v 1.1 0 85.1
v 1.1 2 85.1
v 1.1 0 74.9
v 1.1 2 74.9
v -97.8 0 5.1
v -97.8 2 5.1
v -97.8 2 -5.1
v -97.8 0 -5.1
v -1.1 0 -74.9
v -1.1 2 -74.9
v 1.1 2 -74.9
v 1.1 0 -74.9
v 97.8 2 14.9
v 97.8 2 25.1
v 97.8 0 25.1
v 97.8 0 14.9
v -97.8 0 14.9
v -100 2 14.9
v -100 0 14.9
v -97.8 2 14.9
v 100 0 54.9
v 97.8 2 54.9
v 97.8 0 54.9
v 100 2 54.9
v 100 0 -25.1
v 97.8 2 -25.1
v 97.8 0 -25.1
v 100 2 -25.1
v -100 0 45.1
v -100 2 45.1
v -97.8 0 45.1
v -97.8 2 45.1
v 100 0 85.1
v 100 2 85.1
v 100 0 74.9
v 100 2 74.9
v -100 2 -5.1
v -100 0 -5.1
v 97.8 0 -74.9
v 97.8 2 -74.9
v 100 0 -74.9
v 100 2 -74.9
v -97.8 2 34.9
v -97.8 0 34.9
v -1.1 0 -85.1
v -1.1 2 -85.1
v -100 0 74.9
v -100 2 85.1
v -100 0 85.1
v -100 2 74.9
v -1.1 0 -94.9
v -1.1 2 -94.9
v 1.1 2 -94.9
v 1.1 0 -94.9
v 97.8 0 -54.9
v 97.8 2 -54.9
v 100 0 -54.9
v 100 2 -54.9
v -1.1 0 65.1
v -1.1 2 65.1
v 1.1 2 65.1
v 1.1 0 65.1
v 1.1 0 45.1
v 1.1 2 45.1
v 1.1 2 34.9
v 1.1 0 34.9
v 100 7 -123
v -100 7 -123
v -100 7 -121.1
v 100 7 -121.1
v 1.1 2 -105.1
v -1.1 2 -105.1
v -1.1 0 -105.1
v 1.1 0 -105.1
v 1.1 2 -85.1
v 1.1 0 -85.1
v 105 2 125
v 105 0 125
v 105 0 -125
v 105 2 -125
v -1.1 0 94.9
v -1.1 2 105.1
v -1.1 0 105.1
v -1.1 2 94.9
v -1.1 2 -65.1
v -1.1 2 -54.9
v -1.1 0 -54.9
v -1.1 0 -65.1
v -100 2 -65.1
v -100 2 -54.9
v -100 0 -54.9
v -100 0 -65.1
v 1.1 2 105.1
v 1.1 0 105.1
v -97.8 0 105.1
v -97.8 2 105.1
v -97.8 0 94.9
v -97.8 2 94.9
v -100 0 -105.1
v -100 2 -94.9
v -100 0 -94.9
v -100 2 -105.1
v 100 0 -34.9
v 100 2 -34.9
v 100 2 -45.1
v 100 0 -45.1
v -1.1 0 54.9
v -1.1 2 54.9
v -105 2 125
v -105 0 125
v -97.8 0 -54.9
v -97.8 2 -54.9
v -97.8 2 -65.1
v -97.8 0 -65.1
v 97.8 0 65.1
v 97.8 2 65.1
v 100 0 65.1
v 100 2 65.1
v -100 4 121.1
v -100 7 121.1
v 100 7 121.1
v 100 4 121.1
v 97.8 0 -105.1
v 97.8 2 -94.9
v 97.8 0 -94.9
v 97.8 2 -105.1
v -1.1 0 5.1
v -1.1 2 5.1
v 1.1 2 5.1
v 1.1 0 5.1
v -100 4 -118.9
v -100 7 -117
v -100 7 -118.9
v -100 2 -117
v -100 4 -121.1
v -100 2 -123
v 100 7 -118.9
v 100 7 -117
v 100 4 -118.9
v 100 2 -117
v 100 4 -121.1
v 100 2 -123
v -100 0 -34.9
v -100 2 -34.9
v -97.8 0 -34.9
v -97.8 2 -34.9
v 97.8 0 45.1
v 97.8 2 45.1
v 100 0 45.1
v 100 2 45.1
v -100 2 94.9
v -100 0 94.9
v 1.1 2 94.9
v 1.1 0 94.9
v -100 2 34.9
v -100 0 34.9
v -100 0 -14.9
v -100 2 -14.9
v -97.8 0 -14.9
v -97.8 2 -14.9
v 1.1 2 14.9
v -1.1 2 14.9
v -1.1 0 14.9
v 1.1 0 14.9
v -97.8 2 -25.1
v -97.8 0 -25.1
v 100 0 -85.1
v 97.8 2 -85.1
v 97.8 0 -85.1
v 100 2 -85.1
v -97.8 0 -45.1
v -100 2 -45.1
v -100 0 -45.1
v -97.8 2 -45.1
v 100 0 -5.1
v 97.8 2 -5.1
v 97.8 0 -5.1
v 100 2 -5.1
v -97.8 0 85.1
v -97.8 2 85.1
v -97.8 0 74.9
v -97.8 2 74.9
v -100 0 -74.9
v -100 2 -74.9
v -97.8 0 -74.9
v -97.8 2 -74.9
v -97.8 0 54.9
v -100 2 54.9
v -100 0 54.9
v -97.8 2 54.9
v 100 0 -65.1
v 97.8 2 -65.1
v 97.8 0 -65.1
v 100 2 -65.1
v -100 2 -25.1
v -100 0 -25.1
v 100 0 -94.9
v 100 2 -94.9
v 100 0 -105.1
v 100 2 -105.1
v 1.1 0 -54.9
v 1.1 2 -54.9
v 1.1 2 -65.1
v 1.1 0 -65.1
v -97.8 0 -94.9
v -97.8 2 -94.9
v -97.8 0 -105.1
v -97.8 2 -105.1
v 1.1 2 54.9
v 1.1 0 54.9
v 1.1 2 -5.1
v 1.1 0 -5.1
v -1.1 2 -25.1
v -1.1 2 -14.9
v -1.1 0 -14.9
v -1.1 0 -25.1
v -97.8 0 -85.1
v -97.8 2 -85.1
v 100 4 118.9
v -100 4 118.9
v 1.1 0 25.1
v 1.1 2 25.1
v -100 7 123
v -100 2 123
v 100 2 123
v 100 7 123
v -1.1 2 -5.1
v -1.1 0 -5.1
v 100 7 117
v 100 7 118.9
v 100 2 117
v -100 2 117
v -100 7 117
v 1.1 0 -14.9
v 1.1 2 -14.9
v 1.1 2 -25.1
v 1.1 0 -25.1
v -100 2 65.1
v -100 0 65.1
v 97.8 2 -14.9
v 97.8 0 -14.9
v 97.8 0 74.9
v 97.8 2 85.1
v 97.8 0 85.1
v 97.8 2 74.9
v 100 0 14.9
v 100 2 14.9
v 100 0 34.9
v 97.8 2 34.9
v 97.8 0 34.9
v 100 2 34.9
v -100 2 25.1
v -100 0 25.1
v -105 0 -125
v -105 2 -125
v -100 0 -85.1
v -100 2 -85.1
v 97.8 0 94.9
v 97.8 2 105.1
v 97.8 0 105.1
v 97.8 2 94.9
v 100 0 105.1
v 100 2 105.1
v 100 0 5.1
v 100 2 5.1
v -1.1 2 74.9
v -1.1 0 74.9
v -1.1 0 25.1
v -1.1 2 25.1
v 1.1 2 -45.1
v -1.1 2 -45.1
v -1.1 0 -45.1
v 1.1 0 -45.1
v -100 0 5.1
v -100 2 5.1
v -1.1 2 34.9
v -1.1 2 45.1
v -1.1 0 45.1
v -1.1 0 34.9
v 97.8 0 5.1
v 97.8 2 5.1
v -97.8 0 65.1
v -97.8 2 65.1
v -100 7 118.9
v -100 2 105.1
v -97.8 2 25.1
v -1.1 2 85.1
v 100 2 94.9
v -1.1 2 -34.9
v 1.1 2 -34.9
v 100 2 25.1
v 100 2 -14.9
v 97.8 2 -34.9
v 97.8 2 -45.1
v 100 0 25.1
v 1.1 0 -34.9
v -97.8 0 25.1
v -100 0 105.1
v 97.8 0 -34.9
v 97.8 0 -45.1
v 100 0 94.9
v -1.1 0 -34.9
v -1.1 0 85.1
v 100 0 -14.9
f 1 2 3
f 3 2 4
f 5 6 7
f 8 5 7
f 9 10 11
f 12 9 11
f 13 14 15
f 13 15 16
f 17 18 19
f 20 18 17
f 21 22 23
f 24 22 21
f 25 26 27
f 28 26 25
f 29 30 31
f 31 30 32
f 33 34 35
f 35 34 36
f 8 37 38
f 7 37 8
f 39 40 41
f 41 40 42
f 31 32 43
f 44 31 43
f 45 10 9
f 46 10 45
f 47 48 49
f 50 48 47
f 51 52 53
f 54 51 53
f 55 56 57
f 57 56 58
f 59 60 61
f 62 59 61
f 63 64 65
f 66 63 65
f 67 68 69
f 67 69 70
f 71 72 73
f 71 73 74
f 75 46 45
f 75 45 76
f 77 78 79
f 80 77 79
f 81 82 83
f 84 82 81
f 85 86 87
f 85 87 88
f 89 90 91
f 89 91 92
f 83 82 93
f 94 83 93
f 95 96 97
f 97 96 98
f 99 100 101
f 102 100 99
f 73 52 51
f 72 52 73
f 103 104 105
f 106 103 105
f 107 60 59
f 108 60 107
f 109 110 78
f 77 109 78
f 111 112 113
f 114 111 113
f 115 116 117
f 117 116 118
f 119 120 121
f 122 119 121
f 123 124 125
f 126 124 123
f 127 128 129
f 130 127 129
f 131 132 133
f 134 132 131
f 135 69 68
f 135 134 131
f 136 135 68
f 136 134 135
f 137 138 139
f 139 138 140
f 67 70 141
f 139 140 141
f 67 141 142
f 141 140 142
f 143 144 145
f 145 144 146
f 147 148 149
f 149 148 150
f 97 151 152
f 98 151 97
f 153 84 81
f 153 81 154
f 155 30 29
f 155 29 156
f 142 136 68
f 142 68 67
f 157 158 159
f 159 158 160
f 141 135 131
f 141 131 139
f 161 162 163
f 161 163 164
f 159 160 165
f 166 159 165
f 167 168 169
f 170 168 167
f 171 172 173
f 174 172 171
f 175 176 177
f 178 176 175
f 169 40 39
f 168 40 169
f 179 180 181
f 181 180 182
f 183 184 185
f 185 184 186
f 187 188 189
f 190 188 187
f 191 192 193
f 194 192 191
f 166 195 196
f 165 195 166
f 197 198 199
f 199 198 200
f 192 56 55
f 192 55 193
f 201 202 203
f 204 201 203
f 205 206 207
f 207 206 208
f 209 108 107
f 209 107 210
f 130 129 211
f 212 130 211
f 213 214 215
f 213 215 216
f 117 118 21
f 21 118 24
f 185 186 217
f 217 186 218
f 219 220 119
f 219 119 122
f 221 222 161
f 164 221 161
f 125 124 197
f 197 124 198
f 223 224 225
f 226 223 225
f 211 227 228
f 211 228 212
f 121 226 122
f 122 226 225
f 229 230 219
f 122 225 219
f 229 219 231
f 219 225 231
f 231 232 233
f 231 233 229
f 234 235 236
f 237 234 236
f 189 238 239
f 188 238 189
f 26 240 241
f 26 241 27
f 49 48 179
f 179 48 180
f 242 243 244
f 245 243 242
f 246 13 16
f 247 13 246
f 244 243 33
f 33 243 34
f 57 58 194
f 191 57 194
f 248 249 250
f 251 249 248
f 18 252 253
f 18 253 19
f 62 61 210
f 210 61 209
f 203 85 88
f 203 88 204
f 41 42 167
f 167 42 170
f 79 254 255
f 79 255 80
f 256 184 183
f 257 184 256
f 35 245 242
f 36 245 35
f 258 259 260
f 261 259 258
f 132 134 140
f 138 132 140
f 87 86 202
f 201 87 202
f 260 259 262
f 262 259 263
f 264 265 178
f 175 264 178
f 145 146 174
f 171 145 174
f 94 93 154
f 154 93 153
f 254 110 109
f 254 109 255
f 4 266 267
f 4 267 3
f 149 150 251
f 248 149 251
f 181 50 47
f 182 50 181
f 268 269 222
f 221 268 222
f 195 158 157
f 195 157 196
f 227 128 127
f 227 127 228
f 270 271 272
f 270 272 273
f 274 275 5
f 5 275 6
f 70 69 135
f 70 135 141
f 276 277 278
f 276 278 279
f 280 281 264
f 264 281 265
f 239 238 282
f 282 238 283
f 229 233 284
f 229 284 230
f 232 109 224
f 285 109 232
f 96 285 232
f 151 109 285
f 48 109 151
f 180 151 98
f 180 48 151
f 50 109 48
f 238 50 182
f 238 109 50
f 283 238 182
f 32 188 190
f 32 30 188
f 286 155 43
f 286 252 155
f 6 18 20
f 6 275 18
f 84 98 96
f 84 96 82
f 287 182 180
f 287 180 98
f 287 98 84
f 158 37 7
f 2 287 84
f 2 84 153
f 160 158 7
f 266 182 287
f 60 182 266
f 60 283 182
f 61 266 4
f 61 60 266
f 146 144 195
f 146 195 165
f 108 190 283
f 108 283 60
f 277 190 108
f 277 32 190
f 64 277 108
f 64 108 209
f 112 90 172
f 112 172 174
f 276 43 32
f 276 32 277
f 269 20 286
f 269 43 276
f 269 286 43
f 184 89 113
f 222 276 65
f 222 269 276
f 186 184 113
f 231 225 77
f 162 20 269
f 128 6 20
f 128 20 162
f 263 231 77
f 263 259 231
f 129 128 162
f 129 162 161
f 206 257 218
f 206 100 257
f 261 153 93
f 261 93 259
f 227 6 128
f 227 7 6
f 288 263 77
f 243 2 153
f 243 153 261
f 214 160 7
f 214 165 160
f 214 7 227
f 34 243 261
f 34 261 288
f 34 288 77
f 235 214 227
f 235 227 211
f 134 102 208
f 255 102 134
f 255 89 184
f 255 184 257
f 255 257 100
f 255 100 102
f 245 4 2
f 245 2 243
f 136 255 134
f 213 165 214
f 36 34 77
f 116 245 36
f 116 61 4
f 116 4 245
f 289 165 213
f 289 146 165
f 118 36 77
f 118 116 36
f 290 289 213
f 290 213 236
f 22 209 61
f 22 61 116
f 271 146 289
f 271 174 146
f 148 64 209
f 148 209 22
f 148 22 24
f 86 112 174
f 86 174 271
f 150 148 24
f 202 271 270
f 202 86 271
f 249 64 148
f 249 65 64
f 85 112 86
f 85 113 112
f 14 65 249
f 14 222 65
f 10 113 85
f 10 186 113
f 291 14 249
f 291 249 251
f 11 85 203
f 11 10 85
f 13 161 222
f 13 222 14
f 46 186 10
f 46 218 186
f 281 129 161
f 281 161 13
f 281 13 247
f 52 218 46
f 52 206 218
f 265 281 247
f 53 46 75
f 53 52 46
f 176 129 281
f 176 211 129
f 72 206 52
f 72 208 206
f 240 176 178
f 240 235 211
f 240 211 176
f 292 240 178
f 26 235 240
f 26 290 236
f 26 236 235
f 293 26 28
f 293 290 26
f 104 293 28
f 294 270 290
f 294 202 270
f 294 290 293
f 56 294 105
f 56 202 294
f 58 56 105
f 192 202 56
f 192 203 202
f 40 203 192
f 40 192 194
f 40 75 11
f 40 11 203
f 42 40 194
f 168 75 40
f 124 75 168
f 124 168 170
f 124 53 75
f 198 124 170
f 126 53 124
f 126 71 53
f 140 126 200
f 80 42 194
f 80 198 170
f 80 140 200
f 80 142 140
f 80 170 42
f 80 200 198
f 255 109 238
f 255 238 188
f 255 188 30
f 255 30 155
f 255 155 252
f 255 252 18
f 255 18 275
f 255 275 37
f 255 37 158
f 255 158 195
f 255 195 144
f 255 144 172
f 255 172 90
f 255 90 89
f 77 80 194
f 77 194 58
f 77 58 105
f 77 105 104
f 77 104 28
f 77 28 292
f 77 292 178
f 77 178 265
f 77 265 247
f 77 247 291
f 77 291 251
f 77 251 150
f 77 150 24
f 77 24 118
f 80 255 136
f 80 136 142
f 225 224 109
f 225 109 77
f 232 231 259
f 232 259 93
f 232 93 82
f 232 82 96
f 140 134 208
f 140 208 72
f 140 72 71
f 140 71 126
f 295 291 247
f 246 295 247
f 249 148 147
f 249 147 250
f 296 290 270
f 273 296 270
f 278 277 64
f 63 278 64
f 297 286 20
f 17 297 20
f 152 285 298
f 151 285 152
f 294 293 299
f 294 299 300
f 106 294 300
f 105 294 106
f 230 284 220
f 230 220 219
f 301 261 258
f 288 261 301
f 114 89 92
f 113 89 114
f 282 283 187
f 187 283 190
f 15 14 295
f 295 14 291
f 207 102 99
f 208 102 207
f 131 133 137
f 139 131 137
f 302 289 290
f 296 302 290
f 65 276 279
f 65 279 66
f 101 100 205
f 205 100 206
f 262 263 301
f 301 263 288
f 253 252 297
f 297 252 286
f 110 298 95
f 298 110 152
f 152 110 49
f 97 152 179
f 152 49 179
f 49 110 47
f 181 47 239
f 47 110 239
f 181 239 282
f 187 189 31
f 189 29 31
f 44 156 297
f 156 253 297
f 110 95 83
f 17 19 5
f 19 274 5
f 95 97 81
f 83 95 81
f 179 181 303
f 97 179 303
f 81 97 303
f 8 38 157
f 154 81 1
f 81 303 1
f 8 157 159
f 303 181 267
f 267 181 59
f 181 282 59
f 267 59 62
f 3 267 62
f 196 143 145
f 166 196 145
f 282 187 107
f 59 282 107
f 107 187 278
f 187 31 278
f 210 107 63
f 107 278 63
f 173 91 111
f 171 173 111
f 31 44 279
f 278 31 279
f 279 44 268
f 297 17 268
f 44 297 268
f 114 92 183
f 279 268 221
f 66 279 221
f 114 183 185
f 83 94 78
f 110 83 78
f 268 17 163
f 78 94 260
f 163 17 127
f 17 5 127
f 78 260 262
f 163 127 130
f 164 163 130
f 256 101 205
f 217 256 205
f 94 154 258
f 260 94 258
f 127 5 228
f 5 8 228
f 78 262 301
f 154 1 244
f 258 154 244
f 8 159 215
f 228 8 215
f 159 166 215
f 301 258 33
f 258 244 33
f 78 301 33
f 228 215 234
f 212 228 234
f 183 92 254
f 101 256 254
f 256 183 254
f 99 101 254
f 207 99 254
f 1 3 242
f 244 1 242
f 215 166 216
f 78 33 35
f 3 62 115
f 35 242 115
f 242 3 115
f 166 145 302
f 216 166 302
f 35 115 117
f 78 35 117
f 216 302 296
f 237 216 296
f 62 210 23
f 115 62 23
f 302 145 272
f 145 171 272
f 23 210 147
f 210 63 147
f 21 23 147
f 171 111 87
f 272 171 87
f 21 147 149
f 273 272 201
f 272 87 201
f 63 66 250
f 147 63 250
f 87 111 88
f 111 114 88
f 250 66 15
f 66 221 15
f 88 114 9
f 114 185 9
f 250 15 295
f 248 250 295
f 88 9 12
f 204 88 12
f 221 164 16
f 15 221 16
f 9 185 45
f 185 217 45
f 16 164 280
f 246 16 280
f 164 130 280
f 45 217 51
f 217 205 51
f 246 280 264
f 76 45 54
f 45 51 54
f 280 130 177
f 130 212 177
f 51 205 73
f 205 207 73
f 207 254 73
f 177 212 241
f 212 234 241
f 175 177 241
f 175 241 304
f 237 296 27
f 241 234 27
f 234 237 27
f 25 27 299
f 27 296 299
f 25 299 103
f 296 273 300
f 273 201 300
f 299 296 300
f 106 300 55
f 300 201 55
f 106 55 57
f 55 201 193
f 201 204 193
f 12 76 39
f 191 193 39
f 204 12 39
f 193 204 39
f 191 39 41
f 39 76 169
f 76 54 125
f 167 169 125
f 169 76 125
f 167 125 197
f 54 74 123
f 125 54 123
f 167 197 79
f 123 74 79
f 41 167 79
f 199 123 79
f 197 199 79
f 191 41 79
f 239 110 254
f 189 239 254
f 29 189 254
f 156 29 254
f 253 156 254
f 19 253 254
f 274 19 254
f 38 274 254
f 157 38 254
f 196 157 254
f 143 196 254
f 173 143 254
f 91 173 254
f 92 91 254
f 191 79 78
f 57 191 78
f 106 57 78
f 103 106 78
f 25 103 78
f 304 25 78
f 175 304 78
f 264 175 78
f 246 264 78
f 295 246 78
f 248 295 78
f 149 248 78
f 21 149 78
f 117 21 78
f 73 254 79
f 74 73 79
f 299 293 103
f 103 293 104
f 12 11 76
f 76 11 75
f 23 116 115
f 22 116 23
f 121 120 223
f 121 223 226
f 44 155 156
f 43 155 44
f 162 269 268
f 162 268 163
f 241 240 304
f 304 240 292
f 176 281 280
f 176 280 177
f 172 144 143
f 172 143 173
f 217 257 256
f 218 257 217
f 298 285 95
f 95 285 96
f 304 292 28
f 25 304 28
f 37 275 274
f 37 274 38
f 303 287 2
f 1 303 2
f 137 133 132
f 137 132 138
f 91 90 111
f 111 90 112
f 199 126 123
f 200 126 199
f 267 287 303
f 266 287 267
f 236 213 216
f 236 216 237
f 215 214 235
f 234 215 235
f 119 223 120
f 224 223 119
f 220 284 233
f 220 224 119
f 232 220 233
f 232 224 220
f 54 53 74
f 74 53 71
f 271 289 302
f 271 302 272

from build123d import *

# Parameters (mm, degrees)
SKETCH1_W           = 210
SKETCH1_H           = 250
BOSS_EXTRUDE1_DEPTH = 2
SKETCH2_W           = 200
SKETCH2_H           = 6
BOSS_EXTRUDE2_DEPTH = 5
SKETCH5_W           = 200
SKETCH5_H           = 2.2
CUT_EXTRUDE1_DEPTH  = 3
SKETCH6_W           = 200
SKETCH6_H           = 6
BOSS_EXTRUDE3_DEPTH = 5
SKETCH7_W           = 200
SKETCH7_H           = 2.2
CUT_EXTRUDE2_DEPTH  = 3
SKETCH_2_W          = 2.2
SKETCH_2_H          = 10.2
CUT_EXTRUDE_3_DEPTH = 164.324829711


with BuildPart() as part:
    # Sketch1 → Boss-Extrude1 (new body)
    with BuildSketch(Plane(origin=(0, 0, 0), x_dir=(1, 0, 0), z_dir=(0, 1, 0))):
        Rectangle(SKETCH1_W, SKETCH1_H)
    extrude(amount=BOSS_EXTRUDE1_DEPTH)

    # Sketch2 → Boss-Extrude2 (add)
    with BuildSketch(Plane(origin=(0, 2, 0), x_dir=(1, 0, 0), z_dir=(0, 1, 0))):
        with Locations((0, -120)):
            Rectangle(SKETCH2_W, SKETCH2_H)
    extrude(amount=BOSS_EXTRUDE2_DEPTH)

    # Sketch5 → Cut-Extrude1 (cut)
    with BuildSketch(Plane(origin=(0, 7, 0), x_dir=(1, 0, 0), z_dir=(0, 1, 0))):
        with Locations((0, -120)):
            Rectangle(SKETCH5_W, SKETCH5_H)
    extrude(amount=-CUT_EXTRUDE1_DEPTH, mode=Mode.SUBTRACT)

    # Sketch6 → Boss-Extrude3 (add)
    with BuildSketch(Plane(origin=(0, 2, 0), x_dir=(1, 0, 0), z_dir=(0, 1, 0))):
        with Locations((0, 120)):
            Rectangle(SKETCH6_W, SKETCH6_H)
    extrude(amount=BOSS_EXTRUDE3_DEPTH)

    # Sketch7 → Cut-Extrude2 (cut)
    with BuildSketch(Plane(origin=(0, 7, 0), x_dir=(1, 0, 0), z_dir=(0, 1, 0))):
        with Locations((0, 120)):
            Rectangle(SKETCH7_W, SKETCH7_H)
    extrude(amount=-CUT_EXTRUDE2_DEPTH, mode=Mode.SUBTRACT)

    # 草图2 → 切除-拉伸3 (cut, through all)
    with BuildSketch(Plane(origin=(0, 2, 0), x_dir=(1, 0, 0), z_dir=(0, 1, 0))):
        with Locations((0, -20)):
            Rectangle(SKETCH_2_W, SKETCH_2_H)
        Rectangle(SKETCH_2_W, SKETCH_2_H)
        with Locations((0, 20)):
            Rectangle(SKETCH_2_W, SKETCH_2_H)
        with Locations((0, 40)):
            Rectangle(SKETCH_2_W, SKETCH_2_H)
        with Locations((0, 60)):
            Rectangle(SKETCH_2_W, SKETCH_2_H)
        with Locations((0, 80)):
            Rectangle(SKETCH_2_W, SKETCH_2_H)
        with Locations((0, 100)):
            Rectangle(SKETCH_2_W, SKETCH_2_H)
        with Locations((0, -40)):
            Rectangle(SKETCH_2_W, SKETCH_2_H)
        with Locations((0, -60)):
            Rectangle(SKETCH_2_W, SKETCH_2_H)
        with Locations((0, -80)):
            Rectangle(SKETCH_2_W, SKETCH_2_H)
        with Locations((0, -100)):
            Rectangle(SKETCH_2_W, SKETCH_2_H)
        with Locations((98.9, 0)):
            Rectangle(SKETCH_2_W, SKETCH_2_H)
        with Locations((98.9, 20)):
            Rectangle(SKETCH_2_W, SKETCH_2_H)
        with Locations((-98.9, 0)):
            Rectangle(SKETCH_2_W, SKETCH_2_H)
        with Locations((98.9, 40)):
            Rectangle(SKETCH_2_W, SKETCH_2_H)
        with Locations((98.9, 60)):
            Rectangle(SKETCH_2_W, SKETCH_2_H)
        with Locations((98.9, 80)):
            Rectangle(SKETCH_2_W, SKETCH_2_H)
        with Locations((98.9, 100)):
            Rectangle(SKETCH_2_W, SKETCH_2_H)
        with Locations((98.9, -20)):
            Rectangle(SKETCH_2_W, SKETCH_2_H)
        with Locations((98.9, -40)):
            Rectangle(SKETCH_2_W, SKETCH_2_H)
        with Locations((98.9, -60)):
            Rectangle(SKETCH_2_W, SKETCH_2_H)
        with Locations((98.9, -80)):
            Rectangle(SKETCH_2_W, SKETCH_2_H)
        with Locations((98.9, -100)):
            Rectangle(SKETCH_2_W, SKETCH_2_H)
        with Locations((-98.9, 20)):
            Rectangle(SKETCH_2_W, SKETCH_2_H)
        with Locations((-98.9, 40)):
            Rectangle(SKETCH_2_W, SKETCH_2_H)
        with Locations((-98.9, 60)):
            Rectangle(SKETCH_2_W, SKETCH_2_H)
        with Locations((-98.9, 80)):
            Rectangle(SKETCH_2_W, SKETCH_2_H)
        with Locations((-98.9, 100)):
            Rectangle(SKETCH_2_W, SKETCH_2_H)
        with Locations((-98.9, -20)):
            Rectangle(SKETCH_2_W, SKETCH_2_H)
        with Locations((-98.9, -40)):
            Rectangle(SKETCH_2_W, SKETCH_2_H)
        with Locations((-98.9, -60)):
            Rectangle(SKETCH_2_W, SKETCH_2_H)
        with Locations((-98.9, -80)):
            Rectangle(SKETCH_2_W, SKETCH_2_H)
        with Locations((-98.9, -100)):
            Rectangle(SKETCH_2_W, SKETCH_2_H)
    extrude(amount=-CUT_EXTRUDE_3_DEPTH, mode=Mode.SUBTRACT)


solid = part.part
